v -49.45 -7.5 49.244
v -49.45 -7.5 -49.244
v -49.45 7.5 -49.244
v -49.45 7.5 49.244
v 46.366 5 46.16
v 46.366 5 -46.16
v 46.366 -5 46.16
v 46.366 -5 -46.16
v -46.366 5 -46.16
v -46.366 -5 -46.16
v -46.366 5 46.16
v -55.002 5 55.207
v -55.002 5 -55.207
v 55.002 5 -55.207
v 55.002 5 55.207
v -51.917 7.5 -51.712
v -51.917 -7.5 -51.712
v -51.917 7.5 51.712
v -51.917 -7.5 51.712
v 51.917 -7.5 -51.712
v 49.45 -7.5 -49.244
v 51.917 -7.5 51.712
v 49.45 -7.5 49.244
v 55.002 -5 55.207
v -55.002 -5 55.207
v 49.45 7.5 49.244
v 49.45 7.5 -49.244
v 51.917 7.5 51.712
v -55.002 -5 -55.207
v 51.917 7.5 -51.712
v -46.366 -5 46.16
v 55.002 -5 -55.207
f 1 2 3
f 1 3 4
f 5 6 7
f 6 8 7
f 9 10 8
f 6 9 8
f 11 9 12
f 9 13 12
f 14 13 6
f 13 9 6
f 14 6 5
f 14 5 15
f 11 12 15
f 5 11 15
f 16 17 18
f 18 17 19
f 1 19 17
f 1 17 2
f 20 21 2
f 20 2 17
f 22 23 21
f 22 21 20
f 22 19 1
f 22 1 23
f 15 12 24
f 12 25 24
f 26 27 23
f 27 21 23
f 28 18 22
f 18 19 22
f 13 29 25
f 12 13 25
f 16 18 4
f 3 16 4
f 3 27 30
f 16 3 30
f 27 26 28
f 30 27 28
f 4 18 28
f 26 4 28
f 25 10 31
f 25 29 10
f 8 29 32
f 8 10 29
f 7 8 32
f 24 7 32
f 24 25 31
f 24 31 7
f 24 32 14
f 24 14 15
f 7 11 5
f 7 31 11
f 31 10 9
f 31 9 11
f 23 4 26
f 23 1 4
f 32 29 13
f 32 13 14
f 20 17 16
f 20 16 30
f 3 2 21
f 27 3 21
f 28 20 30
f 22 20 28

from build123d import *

# Parameters (mm, degrees)
F0_W     = 103.83486
F0_H     = 103.423626
F0_W_2   = 98.900132
F0_H_2   = 98.488912
F1_DEPTH = 7.5
F0_W_3   = 110.00327
F0_H_3   = 110.414498
F0_W_4   = 92.73173
F0_H_4   = 92.320494
F2_DEPTH = 5


with BuildPart() as f1:
    # F0 (on Front) → F1 (new body, symmetric)
    with BuildSketch(Plane.XZ):
        Rectangle(F0_W, F0_H)
        Rectangle(F0_W_2, F0_H_2, mode=Mode.SUBTRACT)
    extrude(amount=F1_DEPTH, both=True)


with BuildPart() as f2:
    # F0 (on Front) → F2 (new body, symmetric)
    with BuildSketch(Plane.XZ):
        Rectangle(F0_W_3, F0_H_3)
        Rectangle(F0_W, F0_H, mode=Mode.SUBTRACT)
        Rectangle(F0_W, F0_H)
        Rectangle(F0_W_2, F0_H_2, mode=Mode.SUBTRACT)
        Rectangle(F0_W_2, F0_H_2)
        Rectangle(F0_W_4, F0_H_4, mode=Mode.SUBTRACT)
    extrude(amount=F2_DEPTH, both=True)


solid = Compound([f1.part, f2.part])
